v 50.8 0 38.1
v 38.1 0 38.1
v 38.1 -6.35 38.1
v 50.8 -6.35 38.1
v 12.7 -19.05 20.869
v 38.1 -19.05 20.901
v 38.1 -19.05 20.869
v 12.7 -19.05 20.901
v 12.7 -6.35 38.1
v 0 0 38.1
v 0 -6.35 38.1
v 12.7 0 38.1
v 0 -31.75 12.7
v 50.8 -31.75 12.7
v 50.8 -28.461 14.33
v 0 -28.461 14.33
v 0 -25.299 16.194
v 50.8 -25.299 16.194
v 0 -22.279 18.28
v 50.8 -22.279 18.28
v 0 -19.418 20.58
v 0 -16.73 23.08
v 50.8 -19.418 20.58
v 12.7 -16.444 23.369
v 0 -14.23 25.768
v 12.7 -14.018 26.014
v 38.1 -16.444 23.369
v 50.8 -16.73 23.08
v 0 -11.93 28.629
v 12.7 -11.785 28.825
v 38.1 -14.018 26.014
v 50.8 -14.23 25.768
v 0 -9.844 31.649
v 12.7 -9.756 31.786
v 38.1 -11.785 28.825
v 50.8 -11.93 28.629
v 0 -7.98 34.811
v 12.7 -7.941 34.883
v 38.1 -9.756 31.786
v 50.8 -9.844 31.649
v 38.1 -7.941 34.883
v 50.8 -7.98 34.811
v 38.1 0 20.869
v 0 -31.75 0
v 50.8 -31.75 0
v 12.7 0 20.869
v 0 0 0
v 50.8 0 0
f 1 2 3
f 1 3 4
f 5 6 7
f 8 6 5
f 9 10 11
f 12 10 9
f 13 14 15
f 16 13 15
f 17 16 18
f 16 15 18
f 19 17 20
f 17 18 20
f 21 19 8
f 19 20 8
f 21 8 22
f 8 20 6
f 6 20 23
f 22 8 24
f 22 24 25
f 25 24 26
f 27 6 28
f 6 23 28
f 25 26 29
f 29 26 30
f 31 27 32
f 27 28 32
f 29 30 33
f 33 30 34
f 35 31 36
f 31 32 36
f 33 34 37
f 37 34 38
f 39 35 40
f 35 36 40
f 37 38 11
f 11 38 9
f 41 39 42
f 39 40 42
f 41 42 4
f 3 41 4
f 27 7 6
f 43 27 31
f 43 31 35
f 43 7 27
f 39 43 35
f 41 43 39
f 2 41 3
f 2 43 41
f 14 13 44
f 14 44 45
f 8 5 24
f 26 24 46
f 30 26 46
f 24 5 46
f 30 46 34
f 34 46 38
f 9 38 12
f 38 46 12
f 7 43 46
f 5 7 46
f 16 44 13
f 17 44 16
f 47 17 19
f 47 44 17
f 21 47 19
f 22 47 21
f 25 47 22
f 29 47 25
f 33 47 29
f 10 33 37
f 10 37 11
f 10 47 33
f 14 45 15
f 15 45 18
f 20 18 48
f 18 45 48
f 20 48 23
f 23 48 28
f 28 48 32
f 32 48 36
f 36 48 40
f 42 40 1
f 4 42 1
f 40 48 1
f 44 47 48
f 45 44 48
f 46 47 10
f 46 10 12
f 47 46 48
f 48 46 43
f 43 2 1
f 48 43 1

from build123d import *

# Parameters (mm, degrees)
F0_W     = 50.8
F0_H     = 38.1
F1_DEPTH = 31.75
F3_DEPTH = 50.8
F4_W     = 25.4
F4_H     = 17.231492
F5_DEPTH = 19.05


with BuildPart() as f1:
    # F0 (on Front) → F1 (new body)
    with BuildSketch(Plane.XZ):
        with Locations((25.4, 19.05)):
            Rectangle(F0_W, F0_H)
    extrude(amount=F1_DEPTH)

    # F2 (on face) → F3 (cut)
    with BuildSketch(Plane.YZ.offset(50.8)):
        with BuildLine():
            Line((-31.75, 38.1), (-31.75, 12.7))
            ThreePointArc((-31.75, 12.7), (-16.730017, 23.080017), (-6.35, 38.1))
            Line((-6.35, 38.1), (-31.75, 38.1))
        make_face()
    extrude(amount=-F3_DEPTH, mode=Mode.SUBTRACT)

    # F4 (on face) → F5 (cut)
    with BuildSketch(Plane(origin=(0, 0, 0), x_dir=(-1, 0, 0), z_dir=(0, 1, 0))):
        with Locations((-25.4, 29.484254)):
            Rectangle(F4_W, F4_H)
    extrude(amount=-F5_DEPTH, mode=Mode.SUBTRACT)


solid = f1.part
